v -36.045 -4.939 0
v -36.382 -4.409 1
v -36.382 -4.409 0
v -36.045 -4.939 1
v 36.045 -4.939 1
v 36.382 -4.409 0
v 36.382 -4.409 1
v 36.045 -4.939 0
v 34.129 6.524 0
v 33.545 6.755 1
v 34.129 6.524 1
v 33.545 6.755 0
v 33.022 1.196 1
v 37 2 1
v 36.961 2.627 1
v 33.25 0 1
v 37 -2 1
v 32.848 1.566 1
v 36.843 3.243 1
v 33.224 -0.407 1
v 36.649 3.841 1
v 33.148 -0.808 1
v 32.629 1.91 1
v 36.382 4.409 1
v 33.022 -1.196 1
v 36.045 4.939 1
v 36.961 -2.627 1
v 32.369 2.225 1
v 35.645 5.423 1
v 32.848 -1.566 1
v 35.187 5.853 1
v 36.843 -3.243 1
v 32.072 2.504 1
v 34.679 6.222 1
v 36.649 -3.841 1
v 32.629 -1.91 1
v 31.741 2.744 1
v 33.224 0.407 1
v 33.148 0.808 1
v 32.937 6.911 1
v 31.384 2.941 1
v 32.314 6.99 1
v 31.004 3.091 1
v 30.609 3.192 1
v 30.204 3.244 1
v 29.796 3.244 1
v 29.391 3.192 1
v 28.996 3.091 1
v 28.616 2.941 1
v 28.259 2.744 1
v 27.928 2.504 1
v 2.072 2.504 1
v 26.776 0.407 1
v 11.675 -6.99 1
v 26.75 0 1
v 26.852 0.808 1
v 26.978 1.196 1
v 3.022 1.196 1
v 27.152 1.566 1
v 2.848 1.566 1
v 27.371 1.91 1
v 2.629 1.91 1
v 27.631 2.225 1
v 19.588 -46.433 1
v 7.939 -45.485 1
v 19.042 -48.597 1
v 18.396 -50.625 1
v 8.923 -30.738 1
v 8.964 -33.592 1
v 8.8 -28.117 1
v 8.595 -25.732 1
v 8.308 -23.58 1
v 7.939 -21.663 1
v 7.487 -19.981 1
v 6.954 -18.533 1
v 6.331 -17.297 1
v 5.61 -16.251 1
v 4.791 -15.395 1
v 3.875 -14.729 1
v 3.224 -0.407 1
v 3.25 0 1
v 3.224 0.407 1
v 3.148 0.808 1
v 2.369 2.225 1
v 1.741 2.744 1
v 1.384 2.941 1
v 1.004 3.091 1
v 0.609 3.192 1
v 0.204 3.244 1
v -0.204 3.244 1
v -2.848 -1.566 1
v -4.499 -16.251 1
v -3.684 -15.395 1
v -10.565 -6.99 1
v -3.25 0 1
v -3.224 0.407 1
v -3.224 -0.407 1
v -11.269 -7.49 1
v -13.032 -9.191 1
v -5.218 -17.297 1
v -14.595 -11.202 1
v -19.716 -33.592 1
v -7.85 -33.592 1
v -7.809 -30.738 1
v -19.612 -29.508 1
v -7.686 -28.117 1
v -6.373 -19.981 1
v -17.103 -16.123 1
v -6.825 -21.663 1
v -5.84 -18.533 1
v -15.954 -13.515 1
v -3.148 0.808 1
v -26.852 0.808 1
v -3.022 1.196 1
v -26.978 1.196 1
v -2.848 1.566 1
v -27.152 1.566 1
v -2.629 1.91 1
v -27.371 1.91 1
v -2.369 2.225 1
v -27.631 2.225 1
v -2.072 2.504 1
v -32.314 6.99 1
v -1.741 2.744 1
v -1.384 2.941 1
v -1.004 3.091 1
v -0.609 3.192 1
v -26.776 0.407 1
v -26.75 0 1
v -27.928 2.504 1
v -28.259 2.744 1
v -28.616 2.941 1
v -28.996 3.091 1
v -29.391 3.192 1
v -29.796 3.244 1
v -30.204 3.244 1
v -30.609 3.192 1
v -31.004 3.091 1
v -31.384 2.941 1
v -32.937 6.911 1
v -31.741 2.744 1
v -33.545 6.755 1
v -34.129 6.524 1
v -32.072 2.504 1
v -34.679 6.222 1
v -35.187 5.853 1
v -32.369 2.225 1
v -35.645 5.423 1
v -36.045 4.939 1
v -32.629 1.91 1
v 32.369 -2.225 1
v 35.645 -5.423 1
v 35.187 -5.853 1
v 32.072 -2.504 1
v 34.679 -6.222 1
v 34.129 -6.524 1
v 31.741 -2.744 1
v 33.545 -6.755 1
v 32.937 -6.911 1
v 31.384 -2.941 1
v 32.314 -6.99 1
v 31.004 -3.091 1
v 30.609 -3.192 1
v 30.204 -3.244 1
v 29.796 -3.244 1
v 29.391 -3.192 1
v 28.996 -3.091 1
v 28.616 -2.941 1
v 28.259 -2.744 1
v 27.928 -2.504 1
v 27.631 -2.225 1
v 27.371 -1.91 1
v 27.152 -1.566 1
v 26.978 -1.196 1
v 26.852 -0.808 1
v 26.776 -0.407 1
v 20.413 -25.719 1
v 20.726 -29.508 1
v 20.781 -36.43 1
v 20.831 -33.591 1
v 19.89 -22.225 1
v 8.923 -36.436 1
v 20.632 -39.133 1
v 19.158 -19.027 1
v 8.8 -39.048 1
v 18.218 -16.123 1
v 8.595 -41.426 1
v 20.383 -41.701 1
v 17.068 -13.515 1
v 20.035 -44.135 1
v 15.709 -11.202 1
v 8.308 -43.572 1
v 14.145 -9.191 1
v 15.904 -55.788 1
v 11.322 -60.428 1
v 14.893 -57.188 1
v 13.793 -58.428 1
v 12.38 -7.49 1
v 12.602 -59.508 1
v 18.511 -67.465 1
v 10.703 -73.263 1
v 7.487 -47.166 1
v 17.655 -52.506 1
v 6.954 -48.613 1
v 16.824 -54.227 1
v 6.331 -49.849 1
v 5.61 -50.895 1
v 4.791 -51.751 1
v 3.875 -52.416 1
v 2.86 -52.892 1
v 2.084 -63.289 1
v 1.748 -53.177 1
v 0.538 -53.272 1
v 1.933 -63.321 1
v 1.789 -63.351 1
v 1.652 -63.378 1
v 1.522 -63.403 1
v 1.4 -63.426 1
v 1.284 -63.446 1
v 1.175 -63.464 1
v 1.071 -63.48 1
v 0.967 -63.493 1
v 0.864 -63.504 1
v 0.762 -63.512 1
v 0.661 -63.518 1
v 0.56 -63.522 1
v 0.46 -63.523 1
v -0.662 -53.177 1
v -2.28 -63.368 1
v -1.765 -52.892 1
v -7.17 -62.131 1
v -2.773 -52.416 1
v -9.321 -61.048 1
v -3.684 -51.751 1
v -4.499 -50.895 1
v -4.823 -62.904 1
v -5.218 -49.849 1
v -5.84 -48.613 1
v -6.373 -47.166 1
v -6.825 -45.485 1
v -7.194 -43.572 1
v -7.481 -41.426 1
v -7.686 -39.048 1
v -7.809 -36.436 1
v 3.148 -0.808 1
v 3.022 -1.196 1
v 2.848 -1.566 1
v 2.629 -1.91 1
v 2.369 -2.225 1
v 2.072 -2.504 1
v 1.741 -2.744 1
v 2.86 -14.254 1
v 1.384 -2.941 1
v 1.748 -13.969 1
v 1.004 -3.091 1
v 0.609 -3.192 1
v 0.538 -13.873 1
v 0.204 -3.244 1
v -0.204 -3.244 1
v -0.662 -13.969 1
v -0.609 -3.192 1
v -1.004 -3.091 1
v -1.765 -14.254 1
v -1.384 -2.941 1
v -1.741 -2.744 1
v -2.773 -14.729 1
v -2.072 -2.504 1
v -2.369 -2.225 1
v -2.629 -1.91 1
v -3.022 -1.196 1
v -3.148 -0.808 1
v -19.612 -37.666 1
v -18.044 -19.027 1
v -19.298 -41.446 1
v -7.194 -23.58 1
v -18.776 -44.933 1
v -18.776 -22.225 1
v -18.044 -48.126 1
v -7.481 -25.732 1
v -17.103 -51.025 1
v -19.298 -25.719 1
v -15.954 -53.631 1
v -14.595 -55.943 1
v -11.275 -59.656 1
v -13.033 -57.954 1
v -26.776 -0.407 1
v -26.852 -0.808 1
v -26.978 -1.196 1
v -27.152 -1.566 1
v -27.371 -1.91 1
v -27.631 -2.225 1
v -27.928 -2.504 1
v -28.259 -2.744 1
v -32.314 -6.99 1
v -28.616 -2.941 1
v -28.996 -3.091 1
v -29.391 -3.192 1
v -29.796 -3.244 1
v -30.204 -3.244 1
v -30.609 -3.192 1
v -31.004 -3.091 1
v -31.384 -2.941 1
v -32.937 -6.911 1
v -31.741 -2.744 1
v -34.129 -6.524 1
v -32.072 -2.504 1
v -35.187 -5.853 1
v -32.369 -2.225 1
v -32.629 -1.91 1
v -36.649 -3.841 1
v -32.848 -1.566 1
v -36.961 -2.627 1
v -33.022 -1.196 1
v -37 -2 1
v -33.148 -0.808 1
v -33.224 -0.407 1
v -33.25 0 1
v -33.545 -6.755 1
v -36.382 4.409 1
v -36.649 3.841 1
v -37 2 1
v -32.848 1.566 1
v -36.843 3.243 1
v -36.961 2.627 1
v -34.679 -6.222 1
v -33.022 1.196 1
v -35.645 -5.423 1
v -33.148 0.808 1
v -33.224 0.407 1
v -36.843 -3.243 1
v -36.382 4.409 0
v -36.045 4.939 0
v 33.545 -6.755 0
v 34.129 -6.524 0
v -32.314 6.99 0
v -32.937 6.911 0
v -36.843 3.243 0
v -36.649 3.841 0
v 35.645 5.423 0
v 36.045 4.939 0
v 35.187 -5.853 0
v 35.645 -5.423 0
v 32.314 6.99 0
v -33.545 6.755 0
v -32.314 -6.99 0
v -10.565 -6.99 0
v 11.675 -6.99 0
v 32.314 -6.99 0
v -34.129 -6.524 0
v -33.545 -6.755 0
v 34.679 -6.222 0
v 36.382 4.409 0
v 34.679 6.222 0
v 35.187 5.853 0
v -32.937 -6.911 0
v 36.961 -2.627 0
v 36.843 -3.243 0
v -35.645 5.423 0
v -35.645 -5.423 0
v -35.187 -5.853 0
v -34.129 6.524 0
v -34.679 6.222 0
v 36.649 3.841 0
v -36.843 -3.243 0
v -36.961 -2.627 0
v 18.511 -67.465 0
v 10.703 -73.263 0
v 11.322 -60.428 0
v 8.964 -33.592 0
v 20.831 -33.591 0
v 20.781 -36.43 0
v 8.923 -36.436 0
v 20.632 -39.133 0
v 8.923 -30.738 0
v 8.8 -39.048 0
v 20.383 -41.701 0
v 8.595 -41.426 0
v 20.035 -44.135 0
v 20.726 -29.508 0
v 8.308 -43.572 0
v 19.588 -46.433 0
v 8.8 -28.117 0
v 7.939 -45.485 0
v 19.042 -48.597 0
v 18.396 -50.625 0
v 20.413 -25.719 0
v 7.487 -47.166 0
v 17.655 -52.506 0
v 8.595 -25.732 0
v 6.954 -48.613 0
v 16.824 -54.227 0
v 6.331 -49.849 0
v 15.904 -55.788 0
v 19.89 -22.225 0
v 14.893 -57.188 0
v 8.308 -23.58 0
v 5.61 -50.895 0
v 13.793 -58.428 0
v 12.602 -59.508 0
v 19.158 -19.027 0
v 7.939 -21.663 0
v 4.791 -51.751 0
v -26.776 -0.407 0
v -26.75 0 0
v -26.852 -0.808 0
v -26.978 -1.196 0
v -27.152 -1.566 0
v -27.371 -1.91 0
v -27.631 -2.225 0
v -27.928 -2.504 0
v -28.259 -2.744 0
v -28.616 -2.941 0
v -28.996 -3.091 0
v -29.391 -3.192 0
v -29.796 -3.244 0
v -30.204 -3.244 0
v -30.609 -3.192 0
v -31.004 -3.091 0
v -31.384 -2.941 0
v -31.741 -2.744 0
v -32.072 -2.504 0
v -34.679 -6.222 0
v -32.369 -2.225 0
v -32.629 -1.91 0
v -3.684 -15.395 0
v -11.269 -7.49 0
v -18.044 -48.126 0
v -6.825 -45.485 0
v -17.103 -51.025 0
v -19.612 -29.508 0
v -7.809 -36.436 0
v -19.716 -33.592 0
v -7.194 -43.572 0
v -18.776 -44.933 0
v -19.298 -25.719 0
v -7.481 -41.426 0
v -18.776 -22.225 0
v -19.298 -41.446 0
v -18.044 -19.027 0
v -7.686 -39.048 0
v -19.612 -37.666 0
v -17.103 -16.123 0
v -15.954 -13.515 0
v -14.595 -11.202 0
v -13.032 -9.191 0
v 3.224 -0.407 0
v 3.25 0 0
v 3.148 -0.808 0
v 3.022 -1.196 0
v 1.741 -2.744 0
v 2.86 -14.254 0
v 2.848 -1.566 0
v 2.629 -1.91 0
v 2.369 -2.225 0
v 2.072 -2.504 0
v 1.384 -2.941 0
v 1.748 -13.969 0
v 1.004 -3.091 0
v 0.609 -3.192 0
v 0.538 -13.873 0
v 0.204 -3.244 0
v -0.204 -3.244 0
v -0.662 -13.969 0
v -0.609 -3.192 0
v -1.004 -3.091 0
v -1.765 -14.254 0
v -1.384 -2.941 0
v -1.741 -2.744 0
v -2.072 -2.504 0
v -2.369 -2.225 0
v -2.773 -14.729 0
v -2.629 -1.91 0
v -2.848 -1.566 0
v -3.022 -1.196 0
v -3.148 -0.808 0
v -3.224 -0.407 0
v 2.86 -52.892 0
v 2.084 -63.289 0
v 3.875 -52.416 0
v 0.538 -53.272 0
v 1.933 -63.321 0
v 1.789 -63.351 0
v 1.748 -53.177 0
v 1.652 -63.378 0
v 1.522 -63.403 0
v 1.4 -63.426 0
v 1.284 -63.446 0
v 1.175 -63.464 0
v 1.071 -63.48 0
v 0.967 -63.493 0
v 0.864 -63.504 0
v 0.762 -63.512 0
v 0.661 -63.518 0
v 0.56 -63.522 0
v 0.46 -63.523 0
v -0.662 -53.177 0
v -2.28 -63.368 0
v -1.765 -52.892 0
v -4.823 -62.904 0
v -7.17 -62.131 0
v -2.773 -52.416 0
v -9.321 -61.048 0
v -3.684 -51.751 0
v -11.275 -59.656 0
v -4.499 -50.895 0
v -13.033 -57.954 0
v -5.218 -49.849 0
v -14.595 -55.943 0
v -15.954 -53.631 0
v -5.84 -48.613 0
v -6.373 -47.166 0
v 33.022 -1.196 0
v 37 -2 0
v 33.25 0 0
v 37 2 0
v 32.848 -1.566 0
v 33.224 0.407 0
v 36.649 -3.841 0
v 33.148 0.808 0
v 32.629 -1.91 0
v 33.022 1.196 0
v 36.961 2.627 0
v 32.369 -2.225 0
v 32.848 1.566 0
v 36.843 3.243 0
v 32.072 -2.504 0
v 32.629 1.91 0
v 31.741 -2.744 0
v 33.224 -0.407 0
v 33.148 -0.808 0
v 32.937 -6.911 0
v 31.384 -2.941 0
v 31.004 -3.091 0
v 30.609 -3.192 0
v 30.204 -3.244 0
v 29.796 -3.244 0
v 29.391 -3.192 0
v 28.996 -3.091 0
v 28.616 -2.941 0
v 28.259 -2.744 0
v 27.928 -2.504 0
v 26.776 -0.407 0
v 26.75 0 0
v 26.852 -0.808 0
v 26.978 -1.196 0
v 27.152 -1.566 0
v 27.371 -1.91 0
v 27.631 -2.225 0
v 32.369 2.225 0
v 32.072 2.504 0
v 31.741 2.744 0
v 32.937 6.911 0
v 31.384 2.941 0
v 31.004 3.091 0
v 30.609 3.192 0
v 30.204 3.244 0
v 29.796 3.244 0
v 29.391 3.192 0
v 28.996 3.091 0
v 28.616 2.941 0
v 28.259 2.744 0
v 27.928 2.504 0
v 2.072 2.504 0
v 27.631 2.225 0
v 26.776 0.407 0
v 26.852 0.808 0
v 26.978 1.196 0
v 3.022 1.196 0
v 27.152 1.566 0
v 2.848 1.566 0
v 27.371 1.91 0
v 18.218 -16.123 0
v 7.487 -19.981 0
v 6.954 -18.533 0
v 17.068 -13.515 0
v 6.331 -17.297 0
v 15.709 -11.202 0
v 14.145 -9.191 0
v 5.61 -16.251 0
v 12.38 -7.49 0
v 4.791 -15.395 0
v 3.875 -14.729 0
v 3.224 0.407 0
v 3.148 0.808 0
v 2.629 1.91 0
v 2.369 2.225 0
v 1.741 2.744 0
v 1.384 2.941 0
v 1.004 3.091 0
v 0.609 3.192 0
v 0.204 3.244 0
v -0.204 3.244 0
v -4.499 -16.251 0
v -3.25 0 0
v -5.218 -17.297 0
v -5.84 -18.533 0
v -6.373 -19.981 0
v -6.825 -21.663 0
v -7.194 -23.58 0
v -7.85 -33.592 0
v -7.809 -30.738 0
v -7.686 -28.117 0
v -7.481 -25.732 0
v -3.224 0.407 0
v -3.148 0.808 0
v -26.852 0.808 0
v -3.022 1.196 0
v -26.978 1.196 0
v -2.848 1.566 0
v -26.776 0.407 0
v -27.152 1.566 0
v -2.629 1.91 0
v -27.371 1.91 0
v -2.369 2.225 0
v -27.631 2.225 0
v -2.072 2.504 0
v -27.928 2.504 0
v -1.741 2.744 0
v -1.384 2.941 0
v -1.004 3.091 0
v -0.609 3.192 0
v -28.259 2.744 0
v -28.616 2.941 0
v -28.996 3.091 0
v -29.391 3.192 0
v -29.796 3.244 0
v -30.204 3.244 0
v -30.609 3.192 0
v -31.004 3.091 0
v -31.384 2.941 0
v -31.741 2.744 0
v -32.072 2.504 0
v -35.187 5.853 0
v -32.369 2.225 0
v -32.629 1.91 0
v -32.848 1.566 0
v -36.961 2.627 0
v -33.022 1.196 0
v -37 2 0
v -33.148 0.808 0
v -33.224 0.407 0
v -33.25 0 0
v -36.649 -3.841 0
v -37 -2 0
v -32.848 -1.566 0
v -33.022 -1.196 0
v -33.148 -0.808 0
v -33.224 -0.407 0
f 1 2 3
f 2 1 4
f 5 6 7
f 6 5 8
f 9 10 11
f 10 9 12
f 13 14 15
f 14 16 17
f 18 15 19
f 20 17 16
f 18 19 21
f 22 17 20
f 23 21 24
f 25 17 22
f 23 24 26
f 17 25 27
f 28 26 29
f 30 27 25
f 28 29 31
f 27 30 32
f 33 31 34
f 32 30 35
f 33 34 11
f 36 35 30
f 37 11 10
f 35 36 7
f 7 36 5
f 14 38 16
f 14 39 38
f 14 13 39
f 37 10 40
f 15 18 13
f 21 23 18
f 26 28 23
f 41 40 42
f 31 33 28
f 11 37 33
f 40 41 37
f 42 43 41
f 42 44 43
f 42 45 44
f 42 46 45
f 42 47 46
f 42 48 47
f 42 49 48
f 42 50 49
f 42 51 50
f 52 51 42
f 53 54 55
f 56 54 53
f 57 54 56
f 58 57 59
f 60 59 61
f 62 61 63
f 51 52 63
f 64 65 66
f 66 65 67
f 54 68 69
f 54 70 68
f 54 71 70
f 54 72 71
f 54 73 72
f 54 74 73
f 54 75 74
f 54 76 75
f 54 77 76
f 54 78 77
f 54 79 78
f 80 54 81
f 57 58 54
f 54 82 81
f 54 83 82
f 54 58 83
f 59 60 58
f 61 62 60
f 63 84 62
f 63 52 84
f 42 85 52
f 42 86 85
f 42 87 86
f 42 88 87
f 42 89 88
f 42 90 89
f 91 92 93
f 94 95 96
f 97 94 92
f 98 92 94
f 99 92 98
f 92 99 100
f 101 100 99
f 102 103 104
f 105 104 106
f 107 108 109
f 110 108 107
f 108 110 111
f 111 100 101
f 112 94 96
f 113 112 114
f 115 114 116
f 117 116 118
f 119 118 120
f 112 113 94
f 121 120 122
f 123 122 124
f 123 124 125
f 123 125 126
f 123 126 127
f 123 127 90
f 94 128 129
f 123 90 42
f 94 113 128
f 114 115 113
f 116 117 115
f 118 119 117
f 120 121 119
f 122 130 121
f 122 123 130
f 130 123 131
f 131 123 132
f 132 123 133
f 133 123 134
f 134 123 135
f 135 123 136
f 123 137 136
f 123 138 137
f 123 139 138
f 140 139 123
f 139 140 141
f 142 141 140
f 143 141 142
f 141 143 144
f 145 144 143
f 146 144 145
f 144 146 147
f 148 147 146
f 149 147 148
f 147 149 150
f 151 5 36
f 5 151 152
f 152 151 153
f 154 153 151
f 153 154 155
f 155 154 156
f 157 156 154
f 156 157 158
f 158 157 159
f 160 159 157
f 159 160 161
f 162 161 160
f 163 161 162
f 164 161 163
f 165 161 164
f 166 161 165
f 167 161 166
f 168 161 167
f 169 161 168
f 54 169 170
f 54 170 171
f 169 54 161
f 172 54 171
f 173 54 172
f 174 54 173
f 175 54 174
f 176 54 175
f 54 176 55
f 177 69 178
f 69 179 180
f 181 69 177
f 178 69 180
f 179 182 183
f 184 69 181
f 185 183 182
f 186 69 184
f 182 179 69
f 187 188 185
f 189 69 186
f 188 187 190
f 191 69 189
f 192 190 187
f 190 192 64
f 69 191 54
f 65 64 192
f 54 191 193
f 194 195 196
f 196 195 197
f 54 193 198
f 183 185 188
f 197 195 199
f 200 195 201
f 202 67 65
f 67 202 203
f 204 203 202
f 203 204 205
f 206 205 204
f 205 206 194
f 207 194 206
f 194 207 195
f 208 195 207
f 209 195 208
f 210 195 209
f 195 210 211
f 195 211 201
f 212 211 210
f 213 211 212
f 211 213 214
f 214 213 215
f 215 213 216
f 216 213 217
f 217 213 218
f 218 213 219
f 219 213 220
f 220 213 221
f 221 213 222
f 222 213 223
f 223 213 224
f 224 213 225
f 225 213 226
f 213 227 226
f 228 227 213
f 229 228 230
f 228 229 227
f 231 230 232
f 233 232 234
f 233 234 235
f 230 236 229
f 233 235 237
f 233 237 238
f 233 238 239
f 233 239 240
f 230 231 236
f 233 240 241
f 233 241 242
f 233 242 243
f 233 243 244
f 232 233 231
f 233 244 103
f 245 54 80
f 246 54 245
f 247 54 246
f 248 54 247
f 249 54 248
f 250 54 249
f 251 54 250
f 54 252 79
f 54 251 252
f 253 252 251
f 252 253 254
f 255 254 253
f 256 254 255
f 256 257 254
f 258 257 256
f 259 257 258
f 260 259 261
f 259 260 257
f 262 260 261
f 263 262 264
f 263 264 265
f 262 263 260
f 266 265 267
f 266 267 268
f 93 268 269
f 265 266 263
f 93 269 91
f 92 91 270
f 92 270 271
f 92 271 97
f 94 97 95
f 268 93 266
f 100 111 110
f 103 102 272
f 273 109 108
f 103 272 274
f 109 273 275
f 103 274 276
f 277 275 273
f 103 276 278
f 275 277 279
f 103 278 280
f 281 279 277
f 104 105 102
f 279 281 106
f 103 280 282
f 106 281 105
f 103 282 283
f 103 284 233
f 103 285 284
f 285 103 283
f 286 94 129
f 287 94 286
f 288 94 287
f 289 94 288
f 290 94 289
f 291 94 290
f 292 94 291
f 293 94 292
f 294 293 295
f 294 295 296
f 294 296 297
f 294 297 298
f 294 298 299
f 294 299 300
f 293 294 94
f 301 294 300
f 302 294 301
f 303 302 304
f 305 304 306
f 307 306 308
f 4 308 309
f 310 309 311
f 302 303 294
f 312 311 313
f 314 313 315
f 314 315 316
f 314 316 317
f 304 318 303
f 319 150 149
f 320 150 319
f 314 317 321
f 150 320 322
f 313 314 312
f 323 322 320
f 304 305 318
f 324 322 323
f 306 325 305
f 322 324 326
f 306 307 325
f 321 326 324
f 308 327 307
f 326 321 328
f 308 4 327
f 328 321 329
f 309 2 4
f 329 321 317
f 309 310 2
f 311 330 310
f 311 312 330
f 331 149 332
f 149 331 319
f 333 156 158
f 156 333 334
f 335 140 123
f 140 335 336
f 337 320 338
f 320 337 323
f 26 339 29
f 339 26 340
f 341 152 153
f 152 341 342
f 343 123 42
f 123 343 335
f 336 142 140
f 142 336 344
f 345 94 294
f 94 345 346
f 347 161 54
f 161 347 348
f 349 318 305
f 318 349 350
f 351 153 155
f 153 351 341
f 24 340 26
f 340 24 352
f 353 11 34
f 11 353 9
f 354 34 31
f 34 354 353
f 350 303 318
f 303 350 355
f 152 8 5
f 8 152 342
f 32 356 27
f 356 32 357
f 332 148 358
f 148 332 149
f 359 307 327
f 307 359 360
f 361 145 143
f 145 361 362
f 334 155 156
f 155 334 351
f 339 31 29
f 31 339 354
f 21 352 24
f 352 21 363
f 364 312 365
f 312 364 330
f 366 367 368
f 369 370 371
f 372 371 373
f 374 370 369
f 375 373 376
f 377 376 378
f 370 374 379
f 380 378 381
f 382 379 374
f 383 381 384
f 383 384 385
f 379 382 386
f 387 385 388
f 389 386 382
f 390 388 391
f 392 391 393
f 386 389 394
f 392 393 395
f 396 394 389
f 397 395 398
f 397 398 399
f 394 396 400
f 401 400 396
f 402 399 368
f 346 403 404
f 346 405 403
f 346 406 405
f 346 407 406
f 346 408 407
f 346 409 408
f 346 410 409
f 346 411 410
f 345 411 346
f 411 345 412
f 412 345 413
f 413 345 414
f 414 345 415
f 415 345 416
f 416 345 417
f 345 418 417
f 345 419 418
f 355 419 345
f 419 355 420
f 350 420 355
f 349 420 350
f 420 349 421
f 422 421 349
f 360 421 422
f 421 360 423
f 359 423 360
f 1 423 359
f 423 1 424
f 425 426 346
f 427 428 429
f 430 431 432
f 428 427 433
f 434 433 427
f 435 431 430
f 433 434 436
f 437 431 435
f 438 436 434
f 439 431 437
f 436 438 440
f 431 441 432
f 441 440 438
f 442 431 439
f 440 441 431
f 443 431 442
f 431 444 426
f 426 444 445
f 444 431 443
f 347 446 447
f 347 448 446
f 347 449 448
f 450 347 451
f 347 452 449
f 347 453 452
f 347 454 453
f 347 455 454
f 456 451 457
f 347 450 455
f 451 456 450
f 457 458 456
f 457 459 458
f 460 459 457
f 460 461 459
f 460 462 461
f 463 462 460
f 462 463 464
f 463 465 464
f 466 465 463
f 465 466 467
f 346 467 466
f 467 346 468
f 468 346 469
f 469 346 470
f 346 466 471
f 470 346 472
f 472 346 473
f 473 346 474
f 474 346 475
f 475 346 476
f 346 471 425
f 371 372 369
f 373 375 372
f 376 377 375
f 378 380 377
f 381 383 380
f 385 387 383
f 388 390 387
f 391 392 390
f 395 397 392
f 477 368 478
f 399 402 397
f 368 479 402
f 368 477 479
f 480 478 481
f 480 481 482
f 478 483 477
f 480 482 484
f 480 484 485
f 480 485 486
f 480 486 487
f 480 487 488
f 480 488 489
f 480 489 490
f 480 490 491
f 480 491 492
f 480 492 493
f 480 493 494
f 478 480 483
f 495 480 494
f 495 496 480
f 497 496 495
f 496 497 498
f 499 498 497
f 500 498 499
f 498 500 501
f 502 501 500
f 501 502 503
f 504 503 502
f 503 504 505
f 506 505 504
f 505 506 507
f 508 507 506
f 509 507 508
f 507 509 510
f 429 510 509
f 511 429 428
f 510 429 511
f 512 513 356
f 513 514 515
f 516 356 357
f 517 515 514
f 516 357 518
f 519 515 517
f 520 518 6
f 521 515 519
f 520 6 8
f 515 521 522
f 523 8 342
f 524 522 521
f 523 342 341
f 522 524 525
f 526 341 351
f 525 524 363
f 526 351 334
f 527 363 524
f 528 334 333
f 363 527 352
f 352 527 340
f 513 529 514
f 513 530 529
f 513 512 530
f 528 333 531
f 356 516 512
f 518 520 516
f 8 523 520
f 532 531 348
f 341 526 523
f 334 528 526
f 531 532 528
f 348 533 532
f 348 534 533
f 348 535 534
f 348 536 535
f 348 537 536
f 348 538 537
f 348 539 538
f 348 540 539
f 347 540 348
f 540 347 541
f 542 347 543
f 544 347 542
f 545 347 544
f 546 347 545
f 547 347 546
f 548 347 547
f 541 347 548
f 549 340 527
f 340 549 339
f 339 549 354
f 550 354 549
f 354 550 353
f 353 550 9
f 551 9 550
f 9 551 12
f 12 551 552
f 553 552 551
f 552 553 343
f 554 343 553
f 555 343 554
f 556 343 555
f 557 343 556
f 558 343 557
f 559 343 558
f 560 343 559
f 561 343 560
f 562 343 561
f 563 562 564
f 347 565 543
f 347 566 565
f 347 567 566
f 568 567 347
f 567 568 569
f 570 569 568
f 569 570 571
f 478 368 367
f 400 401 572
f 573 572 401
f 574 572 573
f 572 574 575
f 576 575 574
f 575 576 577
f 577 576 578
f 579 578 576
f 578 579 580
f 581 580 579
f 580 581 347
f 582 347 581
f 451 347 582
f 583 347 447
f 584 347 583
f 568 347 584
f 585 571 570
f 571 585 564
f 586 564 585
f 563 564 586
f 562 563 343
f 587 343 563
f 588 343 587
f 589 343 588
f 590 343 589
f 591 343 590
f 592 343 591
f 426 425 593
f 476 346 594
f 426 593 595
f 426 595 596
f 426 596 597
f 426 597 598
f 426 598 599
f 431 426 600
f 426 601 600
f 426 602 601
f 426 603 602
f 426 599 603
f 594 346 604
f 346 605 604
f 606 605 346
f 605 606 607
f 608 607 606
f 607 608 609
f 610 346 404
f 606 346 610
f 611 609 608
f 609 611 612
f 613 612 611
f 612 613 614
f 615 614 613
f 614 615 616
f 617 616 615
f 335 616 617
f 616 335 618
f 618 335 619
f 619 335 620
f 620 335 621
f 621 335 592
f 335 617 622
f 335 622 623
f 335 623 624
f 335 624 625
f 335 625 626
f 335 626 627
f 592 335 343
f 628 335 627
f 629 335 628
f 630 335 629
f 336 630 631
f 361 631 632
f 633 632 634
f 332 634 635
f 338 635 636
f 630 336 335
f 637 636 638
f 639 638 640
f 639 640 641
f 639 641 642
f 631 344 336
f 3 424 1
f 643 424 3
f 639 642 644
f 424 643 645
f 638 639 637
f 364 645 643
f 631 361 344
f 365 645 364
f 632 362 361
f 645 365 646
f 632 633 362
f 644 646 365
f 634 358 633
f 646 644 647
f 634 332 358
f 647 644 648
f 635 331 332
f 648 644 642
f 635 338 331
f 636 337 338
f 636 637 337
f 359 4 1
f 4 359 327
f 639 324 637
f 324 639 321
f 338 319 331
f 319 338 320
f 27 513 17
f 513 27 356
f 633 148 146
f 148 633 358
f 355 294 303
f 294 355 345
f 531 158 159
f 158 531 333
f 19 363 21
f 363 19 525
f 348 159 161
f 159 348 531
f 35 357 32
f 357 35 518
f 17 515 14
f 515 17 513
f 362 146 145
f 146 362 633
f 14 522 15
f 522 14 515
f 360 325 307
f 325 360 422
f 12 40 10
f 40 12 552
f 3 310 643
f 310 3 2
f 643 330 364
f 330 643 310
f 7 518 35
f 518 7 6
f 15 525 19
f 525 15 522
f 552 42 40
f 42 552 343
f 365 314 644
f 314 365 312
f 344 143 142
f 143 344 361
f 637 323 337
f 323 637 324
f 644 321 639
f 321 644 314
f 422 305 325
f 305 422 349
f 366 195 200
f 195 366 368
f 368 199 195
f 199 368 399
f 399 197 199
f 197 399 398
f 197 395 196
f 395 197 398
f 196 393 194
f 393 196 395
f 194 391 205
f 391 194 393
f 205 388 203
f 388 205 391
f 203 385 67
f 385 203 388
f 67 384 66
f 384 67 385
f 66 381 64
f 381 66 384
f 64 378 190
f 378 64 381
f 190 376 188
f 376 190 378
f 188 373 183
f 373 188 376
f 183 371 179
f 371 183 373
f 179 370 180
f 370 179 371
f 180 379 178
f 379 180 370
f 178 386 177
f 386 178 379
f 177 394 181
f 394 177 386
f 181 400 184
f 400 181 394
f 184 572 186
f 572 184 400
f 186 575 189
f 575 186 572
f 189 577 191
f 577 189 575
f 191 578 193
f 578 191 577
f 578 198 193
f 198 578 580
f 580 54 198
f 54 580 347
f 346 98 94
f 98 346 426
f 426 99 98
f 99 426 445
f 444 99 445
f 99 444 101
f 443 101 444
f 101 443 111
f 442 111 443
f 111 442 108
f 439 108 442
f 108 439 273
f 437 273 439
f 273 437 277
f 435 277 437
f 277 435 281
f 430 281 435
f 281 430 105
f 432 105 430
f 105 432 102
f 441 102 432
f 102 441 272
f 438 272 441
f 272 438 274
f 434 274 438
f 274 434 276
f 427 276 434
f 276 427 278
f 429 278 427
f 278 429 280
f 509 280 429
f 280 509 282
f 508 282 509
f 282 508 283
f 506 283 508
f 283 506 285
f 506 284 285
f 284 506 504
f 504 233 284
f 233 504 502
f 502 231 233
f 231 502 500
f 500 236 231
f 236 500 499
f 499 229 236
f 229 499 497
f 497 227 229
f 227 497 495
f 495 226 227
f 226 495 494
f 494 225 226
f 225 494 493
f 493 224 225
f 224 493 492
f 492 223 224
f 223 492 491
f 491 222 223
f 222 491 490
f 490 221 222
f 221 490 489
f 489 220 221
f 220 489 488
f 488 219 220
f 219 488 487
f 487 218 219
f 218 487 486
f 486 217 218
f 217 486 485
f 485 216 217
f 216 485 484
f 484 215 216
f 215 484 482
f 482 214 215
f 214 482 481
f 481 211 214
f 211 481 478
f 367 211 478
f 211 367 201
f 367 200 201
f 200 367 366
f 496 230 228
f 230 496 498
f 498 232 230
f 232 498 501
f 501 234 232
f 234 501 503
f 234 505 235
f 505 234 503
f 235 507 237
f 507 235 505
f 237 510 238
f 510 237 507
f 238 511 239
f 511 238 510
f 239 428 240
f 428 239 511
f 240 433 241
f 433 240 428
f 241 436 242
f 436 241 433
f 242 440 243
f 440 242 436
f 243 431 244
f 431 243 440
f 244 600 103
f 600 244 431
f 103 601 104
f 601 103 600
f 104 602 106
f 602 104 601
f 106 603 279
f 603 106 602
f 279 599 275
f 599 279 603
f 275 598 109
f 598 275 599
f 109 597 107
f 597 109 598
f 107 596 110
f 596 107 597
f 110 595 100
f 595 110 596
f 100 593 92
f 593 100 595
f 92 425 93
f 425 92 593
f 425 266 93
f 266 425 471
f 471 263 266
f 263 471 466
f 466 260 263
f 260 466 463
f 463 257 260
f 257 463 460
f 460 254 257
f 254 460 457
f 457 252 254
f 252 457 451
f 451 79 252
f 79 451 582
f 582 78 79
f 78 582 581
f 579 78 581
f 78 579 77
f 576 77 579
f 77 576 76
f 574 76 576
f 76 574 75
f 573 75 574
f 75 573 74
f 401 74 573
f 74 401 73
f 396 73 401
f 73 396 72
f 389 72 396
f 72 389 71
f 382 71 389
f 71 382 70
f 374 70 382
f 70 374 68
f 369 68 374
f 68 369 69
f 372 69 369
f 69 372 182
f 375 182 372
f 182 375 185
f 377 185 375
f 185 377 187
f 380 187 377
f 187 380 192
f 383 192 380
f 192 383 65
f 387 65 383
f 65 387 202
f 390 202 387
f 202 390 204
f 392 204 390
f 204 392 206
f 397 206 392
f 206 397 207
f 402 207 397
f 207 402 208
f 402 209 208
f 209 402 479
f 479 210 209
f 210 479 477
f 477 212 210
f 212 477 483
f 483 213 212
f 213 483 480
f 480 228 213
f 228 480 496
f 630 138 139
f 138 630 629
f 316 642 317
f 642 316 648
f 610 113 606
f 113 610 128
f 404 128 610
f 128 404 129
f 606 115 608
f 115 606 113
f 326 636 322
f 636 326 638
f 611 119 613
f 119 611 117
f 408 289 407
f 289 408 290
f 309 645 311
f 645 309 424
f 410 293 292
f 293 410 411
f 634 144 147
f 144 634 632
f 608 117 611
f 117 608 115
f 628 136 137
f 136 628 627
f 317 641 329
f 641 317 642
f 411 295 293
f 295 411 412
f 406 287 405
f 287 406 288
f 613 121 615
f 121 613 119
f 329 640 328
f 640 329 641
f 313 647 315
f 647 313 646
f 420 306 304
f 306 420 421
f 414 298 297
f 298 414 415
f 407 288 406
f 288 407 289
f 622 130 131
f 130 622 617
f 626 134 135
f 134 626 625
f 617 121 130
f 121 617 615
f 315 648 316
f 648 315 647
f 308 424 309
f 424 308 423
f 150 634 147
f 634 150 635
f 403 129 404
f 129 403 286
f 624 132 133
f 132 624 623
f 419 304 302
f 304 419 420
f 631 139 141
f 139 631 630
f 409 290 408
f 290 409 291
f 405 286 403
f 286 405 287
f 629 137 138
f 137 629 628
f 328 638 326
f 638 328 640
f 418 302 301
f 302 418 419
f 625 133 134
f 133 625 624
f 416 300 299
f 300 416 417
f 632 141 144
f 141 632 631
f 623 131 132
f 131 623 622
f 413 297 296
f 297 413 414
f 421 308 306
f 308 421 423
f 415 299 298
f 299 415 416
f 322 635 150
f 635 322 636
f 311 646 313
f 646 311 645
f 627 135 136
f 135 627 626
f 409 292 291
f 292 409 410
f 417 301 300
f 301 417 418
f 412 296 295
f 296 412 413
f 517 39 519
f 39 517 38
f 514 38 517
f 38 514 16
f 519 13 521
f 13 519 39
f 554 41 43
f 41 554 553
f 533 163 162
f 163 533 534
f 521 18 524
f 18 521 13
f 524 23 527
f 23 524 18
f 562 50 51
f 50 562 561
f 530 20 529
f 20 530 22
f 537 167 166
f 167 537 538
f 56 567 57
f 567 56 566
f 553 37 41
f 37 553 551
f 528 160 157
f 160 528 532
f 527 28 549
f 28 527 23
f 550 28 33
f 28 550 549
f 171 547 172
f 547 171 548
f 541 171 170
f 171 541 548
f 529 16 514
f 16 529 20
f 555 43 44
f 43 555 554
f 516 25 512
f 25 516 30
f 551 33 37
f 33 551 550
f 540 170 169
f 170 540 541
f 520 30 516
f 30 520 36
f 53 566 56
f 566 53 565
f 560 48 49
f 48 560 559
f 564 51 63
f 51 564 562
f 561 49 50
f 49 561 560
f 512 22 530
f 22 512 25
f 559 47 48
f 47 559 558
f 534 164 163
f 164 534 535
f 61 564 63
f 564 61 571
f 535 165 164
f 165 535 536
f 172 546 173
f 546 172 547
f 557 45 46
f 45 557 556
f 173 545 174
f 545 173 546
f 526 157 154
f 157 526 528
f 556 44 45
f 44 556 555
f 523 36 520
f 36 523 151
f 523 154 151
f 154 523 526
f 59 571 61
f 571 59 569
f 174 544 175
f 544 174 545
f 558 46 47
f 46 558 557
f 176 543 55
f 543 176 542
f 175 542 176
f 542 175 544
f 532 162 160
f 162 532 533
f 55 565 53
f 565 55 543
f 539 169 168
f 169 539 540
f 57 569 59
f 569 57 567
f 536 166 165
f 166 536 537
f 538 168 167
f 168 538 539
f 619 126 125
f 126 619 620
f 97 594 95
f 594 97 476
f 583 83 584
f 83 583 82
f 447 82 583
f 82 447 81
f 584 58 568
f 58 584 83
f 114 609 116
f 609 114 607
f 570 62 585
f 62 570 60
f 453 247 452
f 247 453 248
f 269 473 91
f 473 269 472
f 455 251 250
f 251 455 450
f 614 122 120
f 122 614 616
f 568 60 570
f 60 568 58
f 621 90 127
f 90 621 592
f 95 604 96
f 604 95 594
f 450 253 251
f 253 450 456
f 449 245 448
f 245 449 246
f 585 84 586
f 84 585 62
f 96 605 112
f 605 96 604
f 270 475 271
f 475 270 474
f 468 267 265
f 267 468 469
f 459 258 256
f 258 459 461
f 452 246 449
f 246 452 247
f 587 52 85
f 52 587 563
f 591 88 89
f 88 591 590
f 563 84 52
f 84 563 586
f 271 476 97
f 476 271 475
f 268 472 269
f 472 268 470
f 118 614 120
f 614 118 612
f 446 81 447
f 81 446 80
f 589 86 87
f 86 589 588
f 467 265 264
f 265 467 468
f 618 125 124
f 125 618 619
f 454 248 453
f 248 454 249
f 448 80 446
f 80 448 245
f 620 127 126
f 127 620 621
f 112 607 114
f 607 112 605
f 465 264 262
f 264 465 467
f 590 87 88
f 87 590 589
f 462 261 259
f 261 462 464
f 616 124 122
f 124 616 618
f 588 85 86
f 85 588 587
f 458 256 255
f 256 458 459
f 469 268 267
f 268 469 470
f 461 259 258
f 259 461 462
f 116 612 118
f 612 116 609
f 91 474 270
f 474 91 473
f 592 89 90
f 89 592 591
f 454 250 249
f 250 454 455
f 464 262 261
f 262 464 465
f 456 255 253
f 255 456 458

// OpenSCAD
$fn = 50;


difference() {
	union() {
		translate(v = [0, 0, 0]) {
			rotate(a = [0, 0, 0]) {
				hull() {
					translate(v = [-32.0000000000, 2.0000000000, 0]) {
						rotate(a = [0, 0, 0]) {
							translate(v = [0, 0, 0]) {
								rotate(a = [0, 0, 0]) {
									cylinder(h = 1, r = 5);
								}
							}
						}
					}
					translate(v = [32.0000000000, 2.0000000000, 0]) {
						rotate(a = [0, 0, 0]) {
							translate(v = [0, 0, 0]) {
								rotate(a = [0, 0, 0]) {
									cylinder(h = 1, r = 5);
								}
							}
						}
					}
					translate(v = [-32.0000000000, -2.0000000000, 0]) {
						rotate(a = [0, 0, 0]) {
							translate(v = [0, 0, 0]) {
								rotate(a = [0, 0, 0]) {
									cylinder(h = 1, r = 5);
								}
							}
						}
					}
					translate(v = [32.0000000000, -2.0000000000, 0]) {
						rotate(a = [0, 0, 0]) {
							translate(v = [0, 0, 0]) {
								rotate(a = [0, 0, 0]) {
									cylinder(h = 1, r = 5);
								}
							}
						}
					}
				}
			}
		}
		translate(v = [0, -5, 0]) {
			rotate(a = [0, 0, 0]) {
				linear_extrude(height = 1) {
					text(font = "DejaVu Sans Mono:style=Bold", halign = "center", size = 57.0000000000, text = "Q", valign = "top");
				}
			}
		}
	}
	union() {
		translate(v = [-30.0000000000, 0.0000000000, -125.0000000000]) {
			rotate(a = [0, 0, 0]) {
				cylinder(h = 250, r = 3.2500000000);
			}
		}
		translate(v = [30.0000000000, 0.0000000000, -125.0000000000]) {
			rotate(a = [0, 0, 0]) {
				cylinder(h = 250, r = 3.2500000000);
			}
		}
		translate(v = [30.0000000000, 0.0000000000, -125.0000000000]) {
			rotate(a = [0, 0, 0]) {
				cylinder(h = 250, r = 3.2500000000);
			}
		}
		translate(v = [0, 0, -125.0000000000]) {
			rotate(a = [0, 0, 0]) {
				cylinder(h = 250, r = 3.2500000000);
			}
		}
	}
}
